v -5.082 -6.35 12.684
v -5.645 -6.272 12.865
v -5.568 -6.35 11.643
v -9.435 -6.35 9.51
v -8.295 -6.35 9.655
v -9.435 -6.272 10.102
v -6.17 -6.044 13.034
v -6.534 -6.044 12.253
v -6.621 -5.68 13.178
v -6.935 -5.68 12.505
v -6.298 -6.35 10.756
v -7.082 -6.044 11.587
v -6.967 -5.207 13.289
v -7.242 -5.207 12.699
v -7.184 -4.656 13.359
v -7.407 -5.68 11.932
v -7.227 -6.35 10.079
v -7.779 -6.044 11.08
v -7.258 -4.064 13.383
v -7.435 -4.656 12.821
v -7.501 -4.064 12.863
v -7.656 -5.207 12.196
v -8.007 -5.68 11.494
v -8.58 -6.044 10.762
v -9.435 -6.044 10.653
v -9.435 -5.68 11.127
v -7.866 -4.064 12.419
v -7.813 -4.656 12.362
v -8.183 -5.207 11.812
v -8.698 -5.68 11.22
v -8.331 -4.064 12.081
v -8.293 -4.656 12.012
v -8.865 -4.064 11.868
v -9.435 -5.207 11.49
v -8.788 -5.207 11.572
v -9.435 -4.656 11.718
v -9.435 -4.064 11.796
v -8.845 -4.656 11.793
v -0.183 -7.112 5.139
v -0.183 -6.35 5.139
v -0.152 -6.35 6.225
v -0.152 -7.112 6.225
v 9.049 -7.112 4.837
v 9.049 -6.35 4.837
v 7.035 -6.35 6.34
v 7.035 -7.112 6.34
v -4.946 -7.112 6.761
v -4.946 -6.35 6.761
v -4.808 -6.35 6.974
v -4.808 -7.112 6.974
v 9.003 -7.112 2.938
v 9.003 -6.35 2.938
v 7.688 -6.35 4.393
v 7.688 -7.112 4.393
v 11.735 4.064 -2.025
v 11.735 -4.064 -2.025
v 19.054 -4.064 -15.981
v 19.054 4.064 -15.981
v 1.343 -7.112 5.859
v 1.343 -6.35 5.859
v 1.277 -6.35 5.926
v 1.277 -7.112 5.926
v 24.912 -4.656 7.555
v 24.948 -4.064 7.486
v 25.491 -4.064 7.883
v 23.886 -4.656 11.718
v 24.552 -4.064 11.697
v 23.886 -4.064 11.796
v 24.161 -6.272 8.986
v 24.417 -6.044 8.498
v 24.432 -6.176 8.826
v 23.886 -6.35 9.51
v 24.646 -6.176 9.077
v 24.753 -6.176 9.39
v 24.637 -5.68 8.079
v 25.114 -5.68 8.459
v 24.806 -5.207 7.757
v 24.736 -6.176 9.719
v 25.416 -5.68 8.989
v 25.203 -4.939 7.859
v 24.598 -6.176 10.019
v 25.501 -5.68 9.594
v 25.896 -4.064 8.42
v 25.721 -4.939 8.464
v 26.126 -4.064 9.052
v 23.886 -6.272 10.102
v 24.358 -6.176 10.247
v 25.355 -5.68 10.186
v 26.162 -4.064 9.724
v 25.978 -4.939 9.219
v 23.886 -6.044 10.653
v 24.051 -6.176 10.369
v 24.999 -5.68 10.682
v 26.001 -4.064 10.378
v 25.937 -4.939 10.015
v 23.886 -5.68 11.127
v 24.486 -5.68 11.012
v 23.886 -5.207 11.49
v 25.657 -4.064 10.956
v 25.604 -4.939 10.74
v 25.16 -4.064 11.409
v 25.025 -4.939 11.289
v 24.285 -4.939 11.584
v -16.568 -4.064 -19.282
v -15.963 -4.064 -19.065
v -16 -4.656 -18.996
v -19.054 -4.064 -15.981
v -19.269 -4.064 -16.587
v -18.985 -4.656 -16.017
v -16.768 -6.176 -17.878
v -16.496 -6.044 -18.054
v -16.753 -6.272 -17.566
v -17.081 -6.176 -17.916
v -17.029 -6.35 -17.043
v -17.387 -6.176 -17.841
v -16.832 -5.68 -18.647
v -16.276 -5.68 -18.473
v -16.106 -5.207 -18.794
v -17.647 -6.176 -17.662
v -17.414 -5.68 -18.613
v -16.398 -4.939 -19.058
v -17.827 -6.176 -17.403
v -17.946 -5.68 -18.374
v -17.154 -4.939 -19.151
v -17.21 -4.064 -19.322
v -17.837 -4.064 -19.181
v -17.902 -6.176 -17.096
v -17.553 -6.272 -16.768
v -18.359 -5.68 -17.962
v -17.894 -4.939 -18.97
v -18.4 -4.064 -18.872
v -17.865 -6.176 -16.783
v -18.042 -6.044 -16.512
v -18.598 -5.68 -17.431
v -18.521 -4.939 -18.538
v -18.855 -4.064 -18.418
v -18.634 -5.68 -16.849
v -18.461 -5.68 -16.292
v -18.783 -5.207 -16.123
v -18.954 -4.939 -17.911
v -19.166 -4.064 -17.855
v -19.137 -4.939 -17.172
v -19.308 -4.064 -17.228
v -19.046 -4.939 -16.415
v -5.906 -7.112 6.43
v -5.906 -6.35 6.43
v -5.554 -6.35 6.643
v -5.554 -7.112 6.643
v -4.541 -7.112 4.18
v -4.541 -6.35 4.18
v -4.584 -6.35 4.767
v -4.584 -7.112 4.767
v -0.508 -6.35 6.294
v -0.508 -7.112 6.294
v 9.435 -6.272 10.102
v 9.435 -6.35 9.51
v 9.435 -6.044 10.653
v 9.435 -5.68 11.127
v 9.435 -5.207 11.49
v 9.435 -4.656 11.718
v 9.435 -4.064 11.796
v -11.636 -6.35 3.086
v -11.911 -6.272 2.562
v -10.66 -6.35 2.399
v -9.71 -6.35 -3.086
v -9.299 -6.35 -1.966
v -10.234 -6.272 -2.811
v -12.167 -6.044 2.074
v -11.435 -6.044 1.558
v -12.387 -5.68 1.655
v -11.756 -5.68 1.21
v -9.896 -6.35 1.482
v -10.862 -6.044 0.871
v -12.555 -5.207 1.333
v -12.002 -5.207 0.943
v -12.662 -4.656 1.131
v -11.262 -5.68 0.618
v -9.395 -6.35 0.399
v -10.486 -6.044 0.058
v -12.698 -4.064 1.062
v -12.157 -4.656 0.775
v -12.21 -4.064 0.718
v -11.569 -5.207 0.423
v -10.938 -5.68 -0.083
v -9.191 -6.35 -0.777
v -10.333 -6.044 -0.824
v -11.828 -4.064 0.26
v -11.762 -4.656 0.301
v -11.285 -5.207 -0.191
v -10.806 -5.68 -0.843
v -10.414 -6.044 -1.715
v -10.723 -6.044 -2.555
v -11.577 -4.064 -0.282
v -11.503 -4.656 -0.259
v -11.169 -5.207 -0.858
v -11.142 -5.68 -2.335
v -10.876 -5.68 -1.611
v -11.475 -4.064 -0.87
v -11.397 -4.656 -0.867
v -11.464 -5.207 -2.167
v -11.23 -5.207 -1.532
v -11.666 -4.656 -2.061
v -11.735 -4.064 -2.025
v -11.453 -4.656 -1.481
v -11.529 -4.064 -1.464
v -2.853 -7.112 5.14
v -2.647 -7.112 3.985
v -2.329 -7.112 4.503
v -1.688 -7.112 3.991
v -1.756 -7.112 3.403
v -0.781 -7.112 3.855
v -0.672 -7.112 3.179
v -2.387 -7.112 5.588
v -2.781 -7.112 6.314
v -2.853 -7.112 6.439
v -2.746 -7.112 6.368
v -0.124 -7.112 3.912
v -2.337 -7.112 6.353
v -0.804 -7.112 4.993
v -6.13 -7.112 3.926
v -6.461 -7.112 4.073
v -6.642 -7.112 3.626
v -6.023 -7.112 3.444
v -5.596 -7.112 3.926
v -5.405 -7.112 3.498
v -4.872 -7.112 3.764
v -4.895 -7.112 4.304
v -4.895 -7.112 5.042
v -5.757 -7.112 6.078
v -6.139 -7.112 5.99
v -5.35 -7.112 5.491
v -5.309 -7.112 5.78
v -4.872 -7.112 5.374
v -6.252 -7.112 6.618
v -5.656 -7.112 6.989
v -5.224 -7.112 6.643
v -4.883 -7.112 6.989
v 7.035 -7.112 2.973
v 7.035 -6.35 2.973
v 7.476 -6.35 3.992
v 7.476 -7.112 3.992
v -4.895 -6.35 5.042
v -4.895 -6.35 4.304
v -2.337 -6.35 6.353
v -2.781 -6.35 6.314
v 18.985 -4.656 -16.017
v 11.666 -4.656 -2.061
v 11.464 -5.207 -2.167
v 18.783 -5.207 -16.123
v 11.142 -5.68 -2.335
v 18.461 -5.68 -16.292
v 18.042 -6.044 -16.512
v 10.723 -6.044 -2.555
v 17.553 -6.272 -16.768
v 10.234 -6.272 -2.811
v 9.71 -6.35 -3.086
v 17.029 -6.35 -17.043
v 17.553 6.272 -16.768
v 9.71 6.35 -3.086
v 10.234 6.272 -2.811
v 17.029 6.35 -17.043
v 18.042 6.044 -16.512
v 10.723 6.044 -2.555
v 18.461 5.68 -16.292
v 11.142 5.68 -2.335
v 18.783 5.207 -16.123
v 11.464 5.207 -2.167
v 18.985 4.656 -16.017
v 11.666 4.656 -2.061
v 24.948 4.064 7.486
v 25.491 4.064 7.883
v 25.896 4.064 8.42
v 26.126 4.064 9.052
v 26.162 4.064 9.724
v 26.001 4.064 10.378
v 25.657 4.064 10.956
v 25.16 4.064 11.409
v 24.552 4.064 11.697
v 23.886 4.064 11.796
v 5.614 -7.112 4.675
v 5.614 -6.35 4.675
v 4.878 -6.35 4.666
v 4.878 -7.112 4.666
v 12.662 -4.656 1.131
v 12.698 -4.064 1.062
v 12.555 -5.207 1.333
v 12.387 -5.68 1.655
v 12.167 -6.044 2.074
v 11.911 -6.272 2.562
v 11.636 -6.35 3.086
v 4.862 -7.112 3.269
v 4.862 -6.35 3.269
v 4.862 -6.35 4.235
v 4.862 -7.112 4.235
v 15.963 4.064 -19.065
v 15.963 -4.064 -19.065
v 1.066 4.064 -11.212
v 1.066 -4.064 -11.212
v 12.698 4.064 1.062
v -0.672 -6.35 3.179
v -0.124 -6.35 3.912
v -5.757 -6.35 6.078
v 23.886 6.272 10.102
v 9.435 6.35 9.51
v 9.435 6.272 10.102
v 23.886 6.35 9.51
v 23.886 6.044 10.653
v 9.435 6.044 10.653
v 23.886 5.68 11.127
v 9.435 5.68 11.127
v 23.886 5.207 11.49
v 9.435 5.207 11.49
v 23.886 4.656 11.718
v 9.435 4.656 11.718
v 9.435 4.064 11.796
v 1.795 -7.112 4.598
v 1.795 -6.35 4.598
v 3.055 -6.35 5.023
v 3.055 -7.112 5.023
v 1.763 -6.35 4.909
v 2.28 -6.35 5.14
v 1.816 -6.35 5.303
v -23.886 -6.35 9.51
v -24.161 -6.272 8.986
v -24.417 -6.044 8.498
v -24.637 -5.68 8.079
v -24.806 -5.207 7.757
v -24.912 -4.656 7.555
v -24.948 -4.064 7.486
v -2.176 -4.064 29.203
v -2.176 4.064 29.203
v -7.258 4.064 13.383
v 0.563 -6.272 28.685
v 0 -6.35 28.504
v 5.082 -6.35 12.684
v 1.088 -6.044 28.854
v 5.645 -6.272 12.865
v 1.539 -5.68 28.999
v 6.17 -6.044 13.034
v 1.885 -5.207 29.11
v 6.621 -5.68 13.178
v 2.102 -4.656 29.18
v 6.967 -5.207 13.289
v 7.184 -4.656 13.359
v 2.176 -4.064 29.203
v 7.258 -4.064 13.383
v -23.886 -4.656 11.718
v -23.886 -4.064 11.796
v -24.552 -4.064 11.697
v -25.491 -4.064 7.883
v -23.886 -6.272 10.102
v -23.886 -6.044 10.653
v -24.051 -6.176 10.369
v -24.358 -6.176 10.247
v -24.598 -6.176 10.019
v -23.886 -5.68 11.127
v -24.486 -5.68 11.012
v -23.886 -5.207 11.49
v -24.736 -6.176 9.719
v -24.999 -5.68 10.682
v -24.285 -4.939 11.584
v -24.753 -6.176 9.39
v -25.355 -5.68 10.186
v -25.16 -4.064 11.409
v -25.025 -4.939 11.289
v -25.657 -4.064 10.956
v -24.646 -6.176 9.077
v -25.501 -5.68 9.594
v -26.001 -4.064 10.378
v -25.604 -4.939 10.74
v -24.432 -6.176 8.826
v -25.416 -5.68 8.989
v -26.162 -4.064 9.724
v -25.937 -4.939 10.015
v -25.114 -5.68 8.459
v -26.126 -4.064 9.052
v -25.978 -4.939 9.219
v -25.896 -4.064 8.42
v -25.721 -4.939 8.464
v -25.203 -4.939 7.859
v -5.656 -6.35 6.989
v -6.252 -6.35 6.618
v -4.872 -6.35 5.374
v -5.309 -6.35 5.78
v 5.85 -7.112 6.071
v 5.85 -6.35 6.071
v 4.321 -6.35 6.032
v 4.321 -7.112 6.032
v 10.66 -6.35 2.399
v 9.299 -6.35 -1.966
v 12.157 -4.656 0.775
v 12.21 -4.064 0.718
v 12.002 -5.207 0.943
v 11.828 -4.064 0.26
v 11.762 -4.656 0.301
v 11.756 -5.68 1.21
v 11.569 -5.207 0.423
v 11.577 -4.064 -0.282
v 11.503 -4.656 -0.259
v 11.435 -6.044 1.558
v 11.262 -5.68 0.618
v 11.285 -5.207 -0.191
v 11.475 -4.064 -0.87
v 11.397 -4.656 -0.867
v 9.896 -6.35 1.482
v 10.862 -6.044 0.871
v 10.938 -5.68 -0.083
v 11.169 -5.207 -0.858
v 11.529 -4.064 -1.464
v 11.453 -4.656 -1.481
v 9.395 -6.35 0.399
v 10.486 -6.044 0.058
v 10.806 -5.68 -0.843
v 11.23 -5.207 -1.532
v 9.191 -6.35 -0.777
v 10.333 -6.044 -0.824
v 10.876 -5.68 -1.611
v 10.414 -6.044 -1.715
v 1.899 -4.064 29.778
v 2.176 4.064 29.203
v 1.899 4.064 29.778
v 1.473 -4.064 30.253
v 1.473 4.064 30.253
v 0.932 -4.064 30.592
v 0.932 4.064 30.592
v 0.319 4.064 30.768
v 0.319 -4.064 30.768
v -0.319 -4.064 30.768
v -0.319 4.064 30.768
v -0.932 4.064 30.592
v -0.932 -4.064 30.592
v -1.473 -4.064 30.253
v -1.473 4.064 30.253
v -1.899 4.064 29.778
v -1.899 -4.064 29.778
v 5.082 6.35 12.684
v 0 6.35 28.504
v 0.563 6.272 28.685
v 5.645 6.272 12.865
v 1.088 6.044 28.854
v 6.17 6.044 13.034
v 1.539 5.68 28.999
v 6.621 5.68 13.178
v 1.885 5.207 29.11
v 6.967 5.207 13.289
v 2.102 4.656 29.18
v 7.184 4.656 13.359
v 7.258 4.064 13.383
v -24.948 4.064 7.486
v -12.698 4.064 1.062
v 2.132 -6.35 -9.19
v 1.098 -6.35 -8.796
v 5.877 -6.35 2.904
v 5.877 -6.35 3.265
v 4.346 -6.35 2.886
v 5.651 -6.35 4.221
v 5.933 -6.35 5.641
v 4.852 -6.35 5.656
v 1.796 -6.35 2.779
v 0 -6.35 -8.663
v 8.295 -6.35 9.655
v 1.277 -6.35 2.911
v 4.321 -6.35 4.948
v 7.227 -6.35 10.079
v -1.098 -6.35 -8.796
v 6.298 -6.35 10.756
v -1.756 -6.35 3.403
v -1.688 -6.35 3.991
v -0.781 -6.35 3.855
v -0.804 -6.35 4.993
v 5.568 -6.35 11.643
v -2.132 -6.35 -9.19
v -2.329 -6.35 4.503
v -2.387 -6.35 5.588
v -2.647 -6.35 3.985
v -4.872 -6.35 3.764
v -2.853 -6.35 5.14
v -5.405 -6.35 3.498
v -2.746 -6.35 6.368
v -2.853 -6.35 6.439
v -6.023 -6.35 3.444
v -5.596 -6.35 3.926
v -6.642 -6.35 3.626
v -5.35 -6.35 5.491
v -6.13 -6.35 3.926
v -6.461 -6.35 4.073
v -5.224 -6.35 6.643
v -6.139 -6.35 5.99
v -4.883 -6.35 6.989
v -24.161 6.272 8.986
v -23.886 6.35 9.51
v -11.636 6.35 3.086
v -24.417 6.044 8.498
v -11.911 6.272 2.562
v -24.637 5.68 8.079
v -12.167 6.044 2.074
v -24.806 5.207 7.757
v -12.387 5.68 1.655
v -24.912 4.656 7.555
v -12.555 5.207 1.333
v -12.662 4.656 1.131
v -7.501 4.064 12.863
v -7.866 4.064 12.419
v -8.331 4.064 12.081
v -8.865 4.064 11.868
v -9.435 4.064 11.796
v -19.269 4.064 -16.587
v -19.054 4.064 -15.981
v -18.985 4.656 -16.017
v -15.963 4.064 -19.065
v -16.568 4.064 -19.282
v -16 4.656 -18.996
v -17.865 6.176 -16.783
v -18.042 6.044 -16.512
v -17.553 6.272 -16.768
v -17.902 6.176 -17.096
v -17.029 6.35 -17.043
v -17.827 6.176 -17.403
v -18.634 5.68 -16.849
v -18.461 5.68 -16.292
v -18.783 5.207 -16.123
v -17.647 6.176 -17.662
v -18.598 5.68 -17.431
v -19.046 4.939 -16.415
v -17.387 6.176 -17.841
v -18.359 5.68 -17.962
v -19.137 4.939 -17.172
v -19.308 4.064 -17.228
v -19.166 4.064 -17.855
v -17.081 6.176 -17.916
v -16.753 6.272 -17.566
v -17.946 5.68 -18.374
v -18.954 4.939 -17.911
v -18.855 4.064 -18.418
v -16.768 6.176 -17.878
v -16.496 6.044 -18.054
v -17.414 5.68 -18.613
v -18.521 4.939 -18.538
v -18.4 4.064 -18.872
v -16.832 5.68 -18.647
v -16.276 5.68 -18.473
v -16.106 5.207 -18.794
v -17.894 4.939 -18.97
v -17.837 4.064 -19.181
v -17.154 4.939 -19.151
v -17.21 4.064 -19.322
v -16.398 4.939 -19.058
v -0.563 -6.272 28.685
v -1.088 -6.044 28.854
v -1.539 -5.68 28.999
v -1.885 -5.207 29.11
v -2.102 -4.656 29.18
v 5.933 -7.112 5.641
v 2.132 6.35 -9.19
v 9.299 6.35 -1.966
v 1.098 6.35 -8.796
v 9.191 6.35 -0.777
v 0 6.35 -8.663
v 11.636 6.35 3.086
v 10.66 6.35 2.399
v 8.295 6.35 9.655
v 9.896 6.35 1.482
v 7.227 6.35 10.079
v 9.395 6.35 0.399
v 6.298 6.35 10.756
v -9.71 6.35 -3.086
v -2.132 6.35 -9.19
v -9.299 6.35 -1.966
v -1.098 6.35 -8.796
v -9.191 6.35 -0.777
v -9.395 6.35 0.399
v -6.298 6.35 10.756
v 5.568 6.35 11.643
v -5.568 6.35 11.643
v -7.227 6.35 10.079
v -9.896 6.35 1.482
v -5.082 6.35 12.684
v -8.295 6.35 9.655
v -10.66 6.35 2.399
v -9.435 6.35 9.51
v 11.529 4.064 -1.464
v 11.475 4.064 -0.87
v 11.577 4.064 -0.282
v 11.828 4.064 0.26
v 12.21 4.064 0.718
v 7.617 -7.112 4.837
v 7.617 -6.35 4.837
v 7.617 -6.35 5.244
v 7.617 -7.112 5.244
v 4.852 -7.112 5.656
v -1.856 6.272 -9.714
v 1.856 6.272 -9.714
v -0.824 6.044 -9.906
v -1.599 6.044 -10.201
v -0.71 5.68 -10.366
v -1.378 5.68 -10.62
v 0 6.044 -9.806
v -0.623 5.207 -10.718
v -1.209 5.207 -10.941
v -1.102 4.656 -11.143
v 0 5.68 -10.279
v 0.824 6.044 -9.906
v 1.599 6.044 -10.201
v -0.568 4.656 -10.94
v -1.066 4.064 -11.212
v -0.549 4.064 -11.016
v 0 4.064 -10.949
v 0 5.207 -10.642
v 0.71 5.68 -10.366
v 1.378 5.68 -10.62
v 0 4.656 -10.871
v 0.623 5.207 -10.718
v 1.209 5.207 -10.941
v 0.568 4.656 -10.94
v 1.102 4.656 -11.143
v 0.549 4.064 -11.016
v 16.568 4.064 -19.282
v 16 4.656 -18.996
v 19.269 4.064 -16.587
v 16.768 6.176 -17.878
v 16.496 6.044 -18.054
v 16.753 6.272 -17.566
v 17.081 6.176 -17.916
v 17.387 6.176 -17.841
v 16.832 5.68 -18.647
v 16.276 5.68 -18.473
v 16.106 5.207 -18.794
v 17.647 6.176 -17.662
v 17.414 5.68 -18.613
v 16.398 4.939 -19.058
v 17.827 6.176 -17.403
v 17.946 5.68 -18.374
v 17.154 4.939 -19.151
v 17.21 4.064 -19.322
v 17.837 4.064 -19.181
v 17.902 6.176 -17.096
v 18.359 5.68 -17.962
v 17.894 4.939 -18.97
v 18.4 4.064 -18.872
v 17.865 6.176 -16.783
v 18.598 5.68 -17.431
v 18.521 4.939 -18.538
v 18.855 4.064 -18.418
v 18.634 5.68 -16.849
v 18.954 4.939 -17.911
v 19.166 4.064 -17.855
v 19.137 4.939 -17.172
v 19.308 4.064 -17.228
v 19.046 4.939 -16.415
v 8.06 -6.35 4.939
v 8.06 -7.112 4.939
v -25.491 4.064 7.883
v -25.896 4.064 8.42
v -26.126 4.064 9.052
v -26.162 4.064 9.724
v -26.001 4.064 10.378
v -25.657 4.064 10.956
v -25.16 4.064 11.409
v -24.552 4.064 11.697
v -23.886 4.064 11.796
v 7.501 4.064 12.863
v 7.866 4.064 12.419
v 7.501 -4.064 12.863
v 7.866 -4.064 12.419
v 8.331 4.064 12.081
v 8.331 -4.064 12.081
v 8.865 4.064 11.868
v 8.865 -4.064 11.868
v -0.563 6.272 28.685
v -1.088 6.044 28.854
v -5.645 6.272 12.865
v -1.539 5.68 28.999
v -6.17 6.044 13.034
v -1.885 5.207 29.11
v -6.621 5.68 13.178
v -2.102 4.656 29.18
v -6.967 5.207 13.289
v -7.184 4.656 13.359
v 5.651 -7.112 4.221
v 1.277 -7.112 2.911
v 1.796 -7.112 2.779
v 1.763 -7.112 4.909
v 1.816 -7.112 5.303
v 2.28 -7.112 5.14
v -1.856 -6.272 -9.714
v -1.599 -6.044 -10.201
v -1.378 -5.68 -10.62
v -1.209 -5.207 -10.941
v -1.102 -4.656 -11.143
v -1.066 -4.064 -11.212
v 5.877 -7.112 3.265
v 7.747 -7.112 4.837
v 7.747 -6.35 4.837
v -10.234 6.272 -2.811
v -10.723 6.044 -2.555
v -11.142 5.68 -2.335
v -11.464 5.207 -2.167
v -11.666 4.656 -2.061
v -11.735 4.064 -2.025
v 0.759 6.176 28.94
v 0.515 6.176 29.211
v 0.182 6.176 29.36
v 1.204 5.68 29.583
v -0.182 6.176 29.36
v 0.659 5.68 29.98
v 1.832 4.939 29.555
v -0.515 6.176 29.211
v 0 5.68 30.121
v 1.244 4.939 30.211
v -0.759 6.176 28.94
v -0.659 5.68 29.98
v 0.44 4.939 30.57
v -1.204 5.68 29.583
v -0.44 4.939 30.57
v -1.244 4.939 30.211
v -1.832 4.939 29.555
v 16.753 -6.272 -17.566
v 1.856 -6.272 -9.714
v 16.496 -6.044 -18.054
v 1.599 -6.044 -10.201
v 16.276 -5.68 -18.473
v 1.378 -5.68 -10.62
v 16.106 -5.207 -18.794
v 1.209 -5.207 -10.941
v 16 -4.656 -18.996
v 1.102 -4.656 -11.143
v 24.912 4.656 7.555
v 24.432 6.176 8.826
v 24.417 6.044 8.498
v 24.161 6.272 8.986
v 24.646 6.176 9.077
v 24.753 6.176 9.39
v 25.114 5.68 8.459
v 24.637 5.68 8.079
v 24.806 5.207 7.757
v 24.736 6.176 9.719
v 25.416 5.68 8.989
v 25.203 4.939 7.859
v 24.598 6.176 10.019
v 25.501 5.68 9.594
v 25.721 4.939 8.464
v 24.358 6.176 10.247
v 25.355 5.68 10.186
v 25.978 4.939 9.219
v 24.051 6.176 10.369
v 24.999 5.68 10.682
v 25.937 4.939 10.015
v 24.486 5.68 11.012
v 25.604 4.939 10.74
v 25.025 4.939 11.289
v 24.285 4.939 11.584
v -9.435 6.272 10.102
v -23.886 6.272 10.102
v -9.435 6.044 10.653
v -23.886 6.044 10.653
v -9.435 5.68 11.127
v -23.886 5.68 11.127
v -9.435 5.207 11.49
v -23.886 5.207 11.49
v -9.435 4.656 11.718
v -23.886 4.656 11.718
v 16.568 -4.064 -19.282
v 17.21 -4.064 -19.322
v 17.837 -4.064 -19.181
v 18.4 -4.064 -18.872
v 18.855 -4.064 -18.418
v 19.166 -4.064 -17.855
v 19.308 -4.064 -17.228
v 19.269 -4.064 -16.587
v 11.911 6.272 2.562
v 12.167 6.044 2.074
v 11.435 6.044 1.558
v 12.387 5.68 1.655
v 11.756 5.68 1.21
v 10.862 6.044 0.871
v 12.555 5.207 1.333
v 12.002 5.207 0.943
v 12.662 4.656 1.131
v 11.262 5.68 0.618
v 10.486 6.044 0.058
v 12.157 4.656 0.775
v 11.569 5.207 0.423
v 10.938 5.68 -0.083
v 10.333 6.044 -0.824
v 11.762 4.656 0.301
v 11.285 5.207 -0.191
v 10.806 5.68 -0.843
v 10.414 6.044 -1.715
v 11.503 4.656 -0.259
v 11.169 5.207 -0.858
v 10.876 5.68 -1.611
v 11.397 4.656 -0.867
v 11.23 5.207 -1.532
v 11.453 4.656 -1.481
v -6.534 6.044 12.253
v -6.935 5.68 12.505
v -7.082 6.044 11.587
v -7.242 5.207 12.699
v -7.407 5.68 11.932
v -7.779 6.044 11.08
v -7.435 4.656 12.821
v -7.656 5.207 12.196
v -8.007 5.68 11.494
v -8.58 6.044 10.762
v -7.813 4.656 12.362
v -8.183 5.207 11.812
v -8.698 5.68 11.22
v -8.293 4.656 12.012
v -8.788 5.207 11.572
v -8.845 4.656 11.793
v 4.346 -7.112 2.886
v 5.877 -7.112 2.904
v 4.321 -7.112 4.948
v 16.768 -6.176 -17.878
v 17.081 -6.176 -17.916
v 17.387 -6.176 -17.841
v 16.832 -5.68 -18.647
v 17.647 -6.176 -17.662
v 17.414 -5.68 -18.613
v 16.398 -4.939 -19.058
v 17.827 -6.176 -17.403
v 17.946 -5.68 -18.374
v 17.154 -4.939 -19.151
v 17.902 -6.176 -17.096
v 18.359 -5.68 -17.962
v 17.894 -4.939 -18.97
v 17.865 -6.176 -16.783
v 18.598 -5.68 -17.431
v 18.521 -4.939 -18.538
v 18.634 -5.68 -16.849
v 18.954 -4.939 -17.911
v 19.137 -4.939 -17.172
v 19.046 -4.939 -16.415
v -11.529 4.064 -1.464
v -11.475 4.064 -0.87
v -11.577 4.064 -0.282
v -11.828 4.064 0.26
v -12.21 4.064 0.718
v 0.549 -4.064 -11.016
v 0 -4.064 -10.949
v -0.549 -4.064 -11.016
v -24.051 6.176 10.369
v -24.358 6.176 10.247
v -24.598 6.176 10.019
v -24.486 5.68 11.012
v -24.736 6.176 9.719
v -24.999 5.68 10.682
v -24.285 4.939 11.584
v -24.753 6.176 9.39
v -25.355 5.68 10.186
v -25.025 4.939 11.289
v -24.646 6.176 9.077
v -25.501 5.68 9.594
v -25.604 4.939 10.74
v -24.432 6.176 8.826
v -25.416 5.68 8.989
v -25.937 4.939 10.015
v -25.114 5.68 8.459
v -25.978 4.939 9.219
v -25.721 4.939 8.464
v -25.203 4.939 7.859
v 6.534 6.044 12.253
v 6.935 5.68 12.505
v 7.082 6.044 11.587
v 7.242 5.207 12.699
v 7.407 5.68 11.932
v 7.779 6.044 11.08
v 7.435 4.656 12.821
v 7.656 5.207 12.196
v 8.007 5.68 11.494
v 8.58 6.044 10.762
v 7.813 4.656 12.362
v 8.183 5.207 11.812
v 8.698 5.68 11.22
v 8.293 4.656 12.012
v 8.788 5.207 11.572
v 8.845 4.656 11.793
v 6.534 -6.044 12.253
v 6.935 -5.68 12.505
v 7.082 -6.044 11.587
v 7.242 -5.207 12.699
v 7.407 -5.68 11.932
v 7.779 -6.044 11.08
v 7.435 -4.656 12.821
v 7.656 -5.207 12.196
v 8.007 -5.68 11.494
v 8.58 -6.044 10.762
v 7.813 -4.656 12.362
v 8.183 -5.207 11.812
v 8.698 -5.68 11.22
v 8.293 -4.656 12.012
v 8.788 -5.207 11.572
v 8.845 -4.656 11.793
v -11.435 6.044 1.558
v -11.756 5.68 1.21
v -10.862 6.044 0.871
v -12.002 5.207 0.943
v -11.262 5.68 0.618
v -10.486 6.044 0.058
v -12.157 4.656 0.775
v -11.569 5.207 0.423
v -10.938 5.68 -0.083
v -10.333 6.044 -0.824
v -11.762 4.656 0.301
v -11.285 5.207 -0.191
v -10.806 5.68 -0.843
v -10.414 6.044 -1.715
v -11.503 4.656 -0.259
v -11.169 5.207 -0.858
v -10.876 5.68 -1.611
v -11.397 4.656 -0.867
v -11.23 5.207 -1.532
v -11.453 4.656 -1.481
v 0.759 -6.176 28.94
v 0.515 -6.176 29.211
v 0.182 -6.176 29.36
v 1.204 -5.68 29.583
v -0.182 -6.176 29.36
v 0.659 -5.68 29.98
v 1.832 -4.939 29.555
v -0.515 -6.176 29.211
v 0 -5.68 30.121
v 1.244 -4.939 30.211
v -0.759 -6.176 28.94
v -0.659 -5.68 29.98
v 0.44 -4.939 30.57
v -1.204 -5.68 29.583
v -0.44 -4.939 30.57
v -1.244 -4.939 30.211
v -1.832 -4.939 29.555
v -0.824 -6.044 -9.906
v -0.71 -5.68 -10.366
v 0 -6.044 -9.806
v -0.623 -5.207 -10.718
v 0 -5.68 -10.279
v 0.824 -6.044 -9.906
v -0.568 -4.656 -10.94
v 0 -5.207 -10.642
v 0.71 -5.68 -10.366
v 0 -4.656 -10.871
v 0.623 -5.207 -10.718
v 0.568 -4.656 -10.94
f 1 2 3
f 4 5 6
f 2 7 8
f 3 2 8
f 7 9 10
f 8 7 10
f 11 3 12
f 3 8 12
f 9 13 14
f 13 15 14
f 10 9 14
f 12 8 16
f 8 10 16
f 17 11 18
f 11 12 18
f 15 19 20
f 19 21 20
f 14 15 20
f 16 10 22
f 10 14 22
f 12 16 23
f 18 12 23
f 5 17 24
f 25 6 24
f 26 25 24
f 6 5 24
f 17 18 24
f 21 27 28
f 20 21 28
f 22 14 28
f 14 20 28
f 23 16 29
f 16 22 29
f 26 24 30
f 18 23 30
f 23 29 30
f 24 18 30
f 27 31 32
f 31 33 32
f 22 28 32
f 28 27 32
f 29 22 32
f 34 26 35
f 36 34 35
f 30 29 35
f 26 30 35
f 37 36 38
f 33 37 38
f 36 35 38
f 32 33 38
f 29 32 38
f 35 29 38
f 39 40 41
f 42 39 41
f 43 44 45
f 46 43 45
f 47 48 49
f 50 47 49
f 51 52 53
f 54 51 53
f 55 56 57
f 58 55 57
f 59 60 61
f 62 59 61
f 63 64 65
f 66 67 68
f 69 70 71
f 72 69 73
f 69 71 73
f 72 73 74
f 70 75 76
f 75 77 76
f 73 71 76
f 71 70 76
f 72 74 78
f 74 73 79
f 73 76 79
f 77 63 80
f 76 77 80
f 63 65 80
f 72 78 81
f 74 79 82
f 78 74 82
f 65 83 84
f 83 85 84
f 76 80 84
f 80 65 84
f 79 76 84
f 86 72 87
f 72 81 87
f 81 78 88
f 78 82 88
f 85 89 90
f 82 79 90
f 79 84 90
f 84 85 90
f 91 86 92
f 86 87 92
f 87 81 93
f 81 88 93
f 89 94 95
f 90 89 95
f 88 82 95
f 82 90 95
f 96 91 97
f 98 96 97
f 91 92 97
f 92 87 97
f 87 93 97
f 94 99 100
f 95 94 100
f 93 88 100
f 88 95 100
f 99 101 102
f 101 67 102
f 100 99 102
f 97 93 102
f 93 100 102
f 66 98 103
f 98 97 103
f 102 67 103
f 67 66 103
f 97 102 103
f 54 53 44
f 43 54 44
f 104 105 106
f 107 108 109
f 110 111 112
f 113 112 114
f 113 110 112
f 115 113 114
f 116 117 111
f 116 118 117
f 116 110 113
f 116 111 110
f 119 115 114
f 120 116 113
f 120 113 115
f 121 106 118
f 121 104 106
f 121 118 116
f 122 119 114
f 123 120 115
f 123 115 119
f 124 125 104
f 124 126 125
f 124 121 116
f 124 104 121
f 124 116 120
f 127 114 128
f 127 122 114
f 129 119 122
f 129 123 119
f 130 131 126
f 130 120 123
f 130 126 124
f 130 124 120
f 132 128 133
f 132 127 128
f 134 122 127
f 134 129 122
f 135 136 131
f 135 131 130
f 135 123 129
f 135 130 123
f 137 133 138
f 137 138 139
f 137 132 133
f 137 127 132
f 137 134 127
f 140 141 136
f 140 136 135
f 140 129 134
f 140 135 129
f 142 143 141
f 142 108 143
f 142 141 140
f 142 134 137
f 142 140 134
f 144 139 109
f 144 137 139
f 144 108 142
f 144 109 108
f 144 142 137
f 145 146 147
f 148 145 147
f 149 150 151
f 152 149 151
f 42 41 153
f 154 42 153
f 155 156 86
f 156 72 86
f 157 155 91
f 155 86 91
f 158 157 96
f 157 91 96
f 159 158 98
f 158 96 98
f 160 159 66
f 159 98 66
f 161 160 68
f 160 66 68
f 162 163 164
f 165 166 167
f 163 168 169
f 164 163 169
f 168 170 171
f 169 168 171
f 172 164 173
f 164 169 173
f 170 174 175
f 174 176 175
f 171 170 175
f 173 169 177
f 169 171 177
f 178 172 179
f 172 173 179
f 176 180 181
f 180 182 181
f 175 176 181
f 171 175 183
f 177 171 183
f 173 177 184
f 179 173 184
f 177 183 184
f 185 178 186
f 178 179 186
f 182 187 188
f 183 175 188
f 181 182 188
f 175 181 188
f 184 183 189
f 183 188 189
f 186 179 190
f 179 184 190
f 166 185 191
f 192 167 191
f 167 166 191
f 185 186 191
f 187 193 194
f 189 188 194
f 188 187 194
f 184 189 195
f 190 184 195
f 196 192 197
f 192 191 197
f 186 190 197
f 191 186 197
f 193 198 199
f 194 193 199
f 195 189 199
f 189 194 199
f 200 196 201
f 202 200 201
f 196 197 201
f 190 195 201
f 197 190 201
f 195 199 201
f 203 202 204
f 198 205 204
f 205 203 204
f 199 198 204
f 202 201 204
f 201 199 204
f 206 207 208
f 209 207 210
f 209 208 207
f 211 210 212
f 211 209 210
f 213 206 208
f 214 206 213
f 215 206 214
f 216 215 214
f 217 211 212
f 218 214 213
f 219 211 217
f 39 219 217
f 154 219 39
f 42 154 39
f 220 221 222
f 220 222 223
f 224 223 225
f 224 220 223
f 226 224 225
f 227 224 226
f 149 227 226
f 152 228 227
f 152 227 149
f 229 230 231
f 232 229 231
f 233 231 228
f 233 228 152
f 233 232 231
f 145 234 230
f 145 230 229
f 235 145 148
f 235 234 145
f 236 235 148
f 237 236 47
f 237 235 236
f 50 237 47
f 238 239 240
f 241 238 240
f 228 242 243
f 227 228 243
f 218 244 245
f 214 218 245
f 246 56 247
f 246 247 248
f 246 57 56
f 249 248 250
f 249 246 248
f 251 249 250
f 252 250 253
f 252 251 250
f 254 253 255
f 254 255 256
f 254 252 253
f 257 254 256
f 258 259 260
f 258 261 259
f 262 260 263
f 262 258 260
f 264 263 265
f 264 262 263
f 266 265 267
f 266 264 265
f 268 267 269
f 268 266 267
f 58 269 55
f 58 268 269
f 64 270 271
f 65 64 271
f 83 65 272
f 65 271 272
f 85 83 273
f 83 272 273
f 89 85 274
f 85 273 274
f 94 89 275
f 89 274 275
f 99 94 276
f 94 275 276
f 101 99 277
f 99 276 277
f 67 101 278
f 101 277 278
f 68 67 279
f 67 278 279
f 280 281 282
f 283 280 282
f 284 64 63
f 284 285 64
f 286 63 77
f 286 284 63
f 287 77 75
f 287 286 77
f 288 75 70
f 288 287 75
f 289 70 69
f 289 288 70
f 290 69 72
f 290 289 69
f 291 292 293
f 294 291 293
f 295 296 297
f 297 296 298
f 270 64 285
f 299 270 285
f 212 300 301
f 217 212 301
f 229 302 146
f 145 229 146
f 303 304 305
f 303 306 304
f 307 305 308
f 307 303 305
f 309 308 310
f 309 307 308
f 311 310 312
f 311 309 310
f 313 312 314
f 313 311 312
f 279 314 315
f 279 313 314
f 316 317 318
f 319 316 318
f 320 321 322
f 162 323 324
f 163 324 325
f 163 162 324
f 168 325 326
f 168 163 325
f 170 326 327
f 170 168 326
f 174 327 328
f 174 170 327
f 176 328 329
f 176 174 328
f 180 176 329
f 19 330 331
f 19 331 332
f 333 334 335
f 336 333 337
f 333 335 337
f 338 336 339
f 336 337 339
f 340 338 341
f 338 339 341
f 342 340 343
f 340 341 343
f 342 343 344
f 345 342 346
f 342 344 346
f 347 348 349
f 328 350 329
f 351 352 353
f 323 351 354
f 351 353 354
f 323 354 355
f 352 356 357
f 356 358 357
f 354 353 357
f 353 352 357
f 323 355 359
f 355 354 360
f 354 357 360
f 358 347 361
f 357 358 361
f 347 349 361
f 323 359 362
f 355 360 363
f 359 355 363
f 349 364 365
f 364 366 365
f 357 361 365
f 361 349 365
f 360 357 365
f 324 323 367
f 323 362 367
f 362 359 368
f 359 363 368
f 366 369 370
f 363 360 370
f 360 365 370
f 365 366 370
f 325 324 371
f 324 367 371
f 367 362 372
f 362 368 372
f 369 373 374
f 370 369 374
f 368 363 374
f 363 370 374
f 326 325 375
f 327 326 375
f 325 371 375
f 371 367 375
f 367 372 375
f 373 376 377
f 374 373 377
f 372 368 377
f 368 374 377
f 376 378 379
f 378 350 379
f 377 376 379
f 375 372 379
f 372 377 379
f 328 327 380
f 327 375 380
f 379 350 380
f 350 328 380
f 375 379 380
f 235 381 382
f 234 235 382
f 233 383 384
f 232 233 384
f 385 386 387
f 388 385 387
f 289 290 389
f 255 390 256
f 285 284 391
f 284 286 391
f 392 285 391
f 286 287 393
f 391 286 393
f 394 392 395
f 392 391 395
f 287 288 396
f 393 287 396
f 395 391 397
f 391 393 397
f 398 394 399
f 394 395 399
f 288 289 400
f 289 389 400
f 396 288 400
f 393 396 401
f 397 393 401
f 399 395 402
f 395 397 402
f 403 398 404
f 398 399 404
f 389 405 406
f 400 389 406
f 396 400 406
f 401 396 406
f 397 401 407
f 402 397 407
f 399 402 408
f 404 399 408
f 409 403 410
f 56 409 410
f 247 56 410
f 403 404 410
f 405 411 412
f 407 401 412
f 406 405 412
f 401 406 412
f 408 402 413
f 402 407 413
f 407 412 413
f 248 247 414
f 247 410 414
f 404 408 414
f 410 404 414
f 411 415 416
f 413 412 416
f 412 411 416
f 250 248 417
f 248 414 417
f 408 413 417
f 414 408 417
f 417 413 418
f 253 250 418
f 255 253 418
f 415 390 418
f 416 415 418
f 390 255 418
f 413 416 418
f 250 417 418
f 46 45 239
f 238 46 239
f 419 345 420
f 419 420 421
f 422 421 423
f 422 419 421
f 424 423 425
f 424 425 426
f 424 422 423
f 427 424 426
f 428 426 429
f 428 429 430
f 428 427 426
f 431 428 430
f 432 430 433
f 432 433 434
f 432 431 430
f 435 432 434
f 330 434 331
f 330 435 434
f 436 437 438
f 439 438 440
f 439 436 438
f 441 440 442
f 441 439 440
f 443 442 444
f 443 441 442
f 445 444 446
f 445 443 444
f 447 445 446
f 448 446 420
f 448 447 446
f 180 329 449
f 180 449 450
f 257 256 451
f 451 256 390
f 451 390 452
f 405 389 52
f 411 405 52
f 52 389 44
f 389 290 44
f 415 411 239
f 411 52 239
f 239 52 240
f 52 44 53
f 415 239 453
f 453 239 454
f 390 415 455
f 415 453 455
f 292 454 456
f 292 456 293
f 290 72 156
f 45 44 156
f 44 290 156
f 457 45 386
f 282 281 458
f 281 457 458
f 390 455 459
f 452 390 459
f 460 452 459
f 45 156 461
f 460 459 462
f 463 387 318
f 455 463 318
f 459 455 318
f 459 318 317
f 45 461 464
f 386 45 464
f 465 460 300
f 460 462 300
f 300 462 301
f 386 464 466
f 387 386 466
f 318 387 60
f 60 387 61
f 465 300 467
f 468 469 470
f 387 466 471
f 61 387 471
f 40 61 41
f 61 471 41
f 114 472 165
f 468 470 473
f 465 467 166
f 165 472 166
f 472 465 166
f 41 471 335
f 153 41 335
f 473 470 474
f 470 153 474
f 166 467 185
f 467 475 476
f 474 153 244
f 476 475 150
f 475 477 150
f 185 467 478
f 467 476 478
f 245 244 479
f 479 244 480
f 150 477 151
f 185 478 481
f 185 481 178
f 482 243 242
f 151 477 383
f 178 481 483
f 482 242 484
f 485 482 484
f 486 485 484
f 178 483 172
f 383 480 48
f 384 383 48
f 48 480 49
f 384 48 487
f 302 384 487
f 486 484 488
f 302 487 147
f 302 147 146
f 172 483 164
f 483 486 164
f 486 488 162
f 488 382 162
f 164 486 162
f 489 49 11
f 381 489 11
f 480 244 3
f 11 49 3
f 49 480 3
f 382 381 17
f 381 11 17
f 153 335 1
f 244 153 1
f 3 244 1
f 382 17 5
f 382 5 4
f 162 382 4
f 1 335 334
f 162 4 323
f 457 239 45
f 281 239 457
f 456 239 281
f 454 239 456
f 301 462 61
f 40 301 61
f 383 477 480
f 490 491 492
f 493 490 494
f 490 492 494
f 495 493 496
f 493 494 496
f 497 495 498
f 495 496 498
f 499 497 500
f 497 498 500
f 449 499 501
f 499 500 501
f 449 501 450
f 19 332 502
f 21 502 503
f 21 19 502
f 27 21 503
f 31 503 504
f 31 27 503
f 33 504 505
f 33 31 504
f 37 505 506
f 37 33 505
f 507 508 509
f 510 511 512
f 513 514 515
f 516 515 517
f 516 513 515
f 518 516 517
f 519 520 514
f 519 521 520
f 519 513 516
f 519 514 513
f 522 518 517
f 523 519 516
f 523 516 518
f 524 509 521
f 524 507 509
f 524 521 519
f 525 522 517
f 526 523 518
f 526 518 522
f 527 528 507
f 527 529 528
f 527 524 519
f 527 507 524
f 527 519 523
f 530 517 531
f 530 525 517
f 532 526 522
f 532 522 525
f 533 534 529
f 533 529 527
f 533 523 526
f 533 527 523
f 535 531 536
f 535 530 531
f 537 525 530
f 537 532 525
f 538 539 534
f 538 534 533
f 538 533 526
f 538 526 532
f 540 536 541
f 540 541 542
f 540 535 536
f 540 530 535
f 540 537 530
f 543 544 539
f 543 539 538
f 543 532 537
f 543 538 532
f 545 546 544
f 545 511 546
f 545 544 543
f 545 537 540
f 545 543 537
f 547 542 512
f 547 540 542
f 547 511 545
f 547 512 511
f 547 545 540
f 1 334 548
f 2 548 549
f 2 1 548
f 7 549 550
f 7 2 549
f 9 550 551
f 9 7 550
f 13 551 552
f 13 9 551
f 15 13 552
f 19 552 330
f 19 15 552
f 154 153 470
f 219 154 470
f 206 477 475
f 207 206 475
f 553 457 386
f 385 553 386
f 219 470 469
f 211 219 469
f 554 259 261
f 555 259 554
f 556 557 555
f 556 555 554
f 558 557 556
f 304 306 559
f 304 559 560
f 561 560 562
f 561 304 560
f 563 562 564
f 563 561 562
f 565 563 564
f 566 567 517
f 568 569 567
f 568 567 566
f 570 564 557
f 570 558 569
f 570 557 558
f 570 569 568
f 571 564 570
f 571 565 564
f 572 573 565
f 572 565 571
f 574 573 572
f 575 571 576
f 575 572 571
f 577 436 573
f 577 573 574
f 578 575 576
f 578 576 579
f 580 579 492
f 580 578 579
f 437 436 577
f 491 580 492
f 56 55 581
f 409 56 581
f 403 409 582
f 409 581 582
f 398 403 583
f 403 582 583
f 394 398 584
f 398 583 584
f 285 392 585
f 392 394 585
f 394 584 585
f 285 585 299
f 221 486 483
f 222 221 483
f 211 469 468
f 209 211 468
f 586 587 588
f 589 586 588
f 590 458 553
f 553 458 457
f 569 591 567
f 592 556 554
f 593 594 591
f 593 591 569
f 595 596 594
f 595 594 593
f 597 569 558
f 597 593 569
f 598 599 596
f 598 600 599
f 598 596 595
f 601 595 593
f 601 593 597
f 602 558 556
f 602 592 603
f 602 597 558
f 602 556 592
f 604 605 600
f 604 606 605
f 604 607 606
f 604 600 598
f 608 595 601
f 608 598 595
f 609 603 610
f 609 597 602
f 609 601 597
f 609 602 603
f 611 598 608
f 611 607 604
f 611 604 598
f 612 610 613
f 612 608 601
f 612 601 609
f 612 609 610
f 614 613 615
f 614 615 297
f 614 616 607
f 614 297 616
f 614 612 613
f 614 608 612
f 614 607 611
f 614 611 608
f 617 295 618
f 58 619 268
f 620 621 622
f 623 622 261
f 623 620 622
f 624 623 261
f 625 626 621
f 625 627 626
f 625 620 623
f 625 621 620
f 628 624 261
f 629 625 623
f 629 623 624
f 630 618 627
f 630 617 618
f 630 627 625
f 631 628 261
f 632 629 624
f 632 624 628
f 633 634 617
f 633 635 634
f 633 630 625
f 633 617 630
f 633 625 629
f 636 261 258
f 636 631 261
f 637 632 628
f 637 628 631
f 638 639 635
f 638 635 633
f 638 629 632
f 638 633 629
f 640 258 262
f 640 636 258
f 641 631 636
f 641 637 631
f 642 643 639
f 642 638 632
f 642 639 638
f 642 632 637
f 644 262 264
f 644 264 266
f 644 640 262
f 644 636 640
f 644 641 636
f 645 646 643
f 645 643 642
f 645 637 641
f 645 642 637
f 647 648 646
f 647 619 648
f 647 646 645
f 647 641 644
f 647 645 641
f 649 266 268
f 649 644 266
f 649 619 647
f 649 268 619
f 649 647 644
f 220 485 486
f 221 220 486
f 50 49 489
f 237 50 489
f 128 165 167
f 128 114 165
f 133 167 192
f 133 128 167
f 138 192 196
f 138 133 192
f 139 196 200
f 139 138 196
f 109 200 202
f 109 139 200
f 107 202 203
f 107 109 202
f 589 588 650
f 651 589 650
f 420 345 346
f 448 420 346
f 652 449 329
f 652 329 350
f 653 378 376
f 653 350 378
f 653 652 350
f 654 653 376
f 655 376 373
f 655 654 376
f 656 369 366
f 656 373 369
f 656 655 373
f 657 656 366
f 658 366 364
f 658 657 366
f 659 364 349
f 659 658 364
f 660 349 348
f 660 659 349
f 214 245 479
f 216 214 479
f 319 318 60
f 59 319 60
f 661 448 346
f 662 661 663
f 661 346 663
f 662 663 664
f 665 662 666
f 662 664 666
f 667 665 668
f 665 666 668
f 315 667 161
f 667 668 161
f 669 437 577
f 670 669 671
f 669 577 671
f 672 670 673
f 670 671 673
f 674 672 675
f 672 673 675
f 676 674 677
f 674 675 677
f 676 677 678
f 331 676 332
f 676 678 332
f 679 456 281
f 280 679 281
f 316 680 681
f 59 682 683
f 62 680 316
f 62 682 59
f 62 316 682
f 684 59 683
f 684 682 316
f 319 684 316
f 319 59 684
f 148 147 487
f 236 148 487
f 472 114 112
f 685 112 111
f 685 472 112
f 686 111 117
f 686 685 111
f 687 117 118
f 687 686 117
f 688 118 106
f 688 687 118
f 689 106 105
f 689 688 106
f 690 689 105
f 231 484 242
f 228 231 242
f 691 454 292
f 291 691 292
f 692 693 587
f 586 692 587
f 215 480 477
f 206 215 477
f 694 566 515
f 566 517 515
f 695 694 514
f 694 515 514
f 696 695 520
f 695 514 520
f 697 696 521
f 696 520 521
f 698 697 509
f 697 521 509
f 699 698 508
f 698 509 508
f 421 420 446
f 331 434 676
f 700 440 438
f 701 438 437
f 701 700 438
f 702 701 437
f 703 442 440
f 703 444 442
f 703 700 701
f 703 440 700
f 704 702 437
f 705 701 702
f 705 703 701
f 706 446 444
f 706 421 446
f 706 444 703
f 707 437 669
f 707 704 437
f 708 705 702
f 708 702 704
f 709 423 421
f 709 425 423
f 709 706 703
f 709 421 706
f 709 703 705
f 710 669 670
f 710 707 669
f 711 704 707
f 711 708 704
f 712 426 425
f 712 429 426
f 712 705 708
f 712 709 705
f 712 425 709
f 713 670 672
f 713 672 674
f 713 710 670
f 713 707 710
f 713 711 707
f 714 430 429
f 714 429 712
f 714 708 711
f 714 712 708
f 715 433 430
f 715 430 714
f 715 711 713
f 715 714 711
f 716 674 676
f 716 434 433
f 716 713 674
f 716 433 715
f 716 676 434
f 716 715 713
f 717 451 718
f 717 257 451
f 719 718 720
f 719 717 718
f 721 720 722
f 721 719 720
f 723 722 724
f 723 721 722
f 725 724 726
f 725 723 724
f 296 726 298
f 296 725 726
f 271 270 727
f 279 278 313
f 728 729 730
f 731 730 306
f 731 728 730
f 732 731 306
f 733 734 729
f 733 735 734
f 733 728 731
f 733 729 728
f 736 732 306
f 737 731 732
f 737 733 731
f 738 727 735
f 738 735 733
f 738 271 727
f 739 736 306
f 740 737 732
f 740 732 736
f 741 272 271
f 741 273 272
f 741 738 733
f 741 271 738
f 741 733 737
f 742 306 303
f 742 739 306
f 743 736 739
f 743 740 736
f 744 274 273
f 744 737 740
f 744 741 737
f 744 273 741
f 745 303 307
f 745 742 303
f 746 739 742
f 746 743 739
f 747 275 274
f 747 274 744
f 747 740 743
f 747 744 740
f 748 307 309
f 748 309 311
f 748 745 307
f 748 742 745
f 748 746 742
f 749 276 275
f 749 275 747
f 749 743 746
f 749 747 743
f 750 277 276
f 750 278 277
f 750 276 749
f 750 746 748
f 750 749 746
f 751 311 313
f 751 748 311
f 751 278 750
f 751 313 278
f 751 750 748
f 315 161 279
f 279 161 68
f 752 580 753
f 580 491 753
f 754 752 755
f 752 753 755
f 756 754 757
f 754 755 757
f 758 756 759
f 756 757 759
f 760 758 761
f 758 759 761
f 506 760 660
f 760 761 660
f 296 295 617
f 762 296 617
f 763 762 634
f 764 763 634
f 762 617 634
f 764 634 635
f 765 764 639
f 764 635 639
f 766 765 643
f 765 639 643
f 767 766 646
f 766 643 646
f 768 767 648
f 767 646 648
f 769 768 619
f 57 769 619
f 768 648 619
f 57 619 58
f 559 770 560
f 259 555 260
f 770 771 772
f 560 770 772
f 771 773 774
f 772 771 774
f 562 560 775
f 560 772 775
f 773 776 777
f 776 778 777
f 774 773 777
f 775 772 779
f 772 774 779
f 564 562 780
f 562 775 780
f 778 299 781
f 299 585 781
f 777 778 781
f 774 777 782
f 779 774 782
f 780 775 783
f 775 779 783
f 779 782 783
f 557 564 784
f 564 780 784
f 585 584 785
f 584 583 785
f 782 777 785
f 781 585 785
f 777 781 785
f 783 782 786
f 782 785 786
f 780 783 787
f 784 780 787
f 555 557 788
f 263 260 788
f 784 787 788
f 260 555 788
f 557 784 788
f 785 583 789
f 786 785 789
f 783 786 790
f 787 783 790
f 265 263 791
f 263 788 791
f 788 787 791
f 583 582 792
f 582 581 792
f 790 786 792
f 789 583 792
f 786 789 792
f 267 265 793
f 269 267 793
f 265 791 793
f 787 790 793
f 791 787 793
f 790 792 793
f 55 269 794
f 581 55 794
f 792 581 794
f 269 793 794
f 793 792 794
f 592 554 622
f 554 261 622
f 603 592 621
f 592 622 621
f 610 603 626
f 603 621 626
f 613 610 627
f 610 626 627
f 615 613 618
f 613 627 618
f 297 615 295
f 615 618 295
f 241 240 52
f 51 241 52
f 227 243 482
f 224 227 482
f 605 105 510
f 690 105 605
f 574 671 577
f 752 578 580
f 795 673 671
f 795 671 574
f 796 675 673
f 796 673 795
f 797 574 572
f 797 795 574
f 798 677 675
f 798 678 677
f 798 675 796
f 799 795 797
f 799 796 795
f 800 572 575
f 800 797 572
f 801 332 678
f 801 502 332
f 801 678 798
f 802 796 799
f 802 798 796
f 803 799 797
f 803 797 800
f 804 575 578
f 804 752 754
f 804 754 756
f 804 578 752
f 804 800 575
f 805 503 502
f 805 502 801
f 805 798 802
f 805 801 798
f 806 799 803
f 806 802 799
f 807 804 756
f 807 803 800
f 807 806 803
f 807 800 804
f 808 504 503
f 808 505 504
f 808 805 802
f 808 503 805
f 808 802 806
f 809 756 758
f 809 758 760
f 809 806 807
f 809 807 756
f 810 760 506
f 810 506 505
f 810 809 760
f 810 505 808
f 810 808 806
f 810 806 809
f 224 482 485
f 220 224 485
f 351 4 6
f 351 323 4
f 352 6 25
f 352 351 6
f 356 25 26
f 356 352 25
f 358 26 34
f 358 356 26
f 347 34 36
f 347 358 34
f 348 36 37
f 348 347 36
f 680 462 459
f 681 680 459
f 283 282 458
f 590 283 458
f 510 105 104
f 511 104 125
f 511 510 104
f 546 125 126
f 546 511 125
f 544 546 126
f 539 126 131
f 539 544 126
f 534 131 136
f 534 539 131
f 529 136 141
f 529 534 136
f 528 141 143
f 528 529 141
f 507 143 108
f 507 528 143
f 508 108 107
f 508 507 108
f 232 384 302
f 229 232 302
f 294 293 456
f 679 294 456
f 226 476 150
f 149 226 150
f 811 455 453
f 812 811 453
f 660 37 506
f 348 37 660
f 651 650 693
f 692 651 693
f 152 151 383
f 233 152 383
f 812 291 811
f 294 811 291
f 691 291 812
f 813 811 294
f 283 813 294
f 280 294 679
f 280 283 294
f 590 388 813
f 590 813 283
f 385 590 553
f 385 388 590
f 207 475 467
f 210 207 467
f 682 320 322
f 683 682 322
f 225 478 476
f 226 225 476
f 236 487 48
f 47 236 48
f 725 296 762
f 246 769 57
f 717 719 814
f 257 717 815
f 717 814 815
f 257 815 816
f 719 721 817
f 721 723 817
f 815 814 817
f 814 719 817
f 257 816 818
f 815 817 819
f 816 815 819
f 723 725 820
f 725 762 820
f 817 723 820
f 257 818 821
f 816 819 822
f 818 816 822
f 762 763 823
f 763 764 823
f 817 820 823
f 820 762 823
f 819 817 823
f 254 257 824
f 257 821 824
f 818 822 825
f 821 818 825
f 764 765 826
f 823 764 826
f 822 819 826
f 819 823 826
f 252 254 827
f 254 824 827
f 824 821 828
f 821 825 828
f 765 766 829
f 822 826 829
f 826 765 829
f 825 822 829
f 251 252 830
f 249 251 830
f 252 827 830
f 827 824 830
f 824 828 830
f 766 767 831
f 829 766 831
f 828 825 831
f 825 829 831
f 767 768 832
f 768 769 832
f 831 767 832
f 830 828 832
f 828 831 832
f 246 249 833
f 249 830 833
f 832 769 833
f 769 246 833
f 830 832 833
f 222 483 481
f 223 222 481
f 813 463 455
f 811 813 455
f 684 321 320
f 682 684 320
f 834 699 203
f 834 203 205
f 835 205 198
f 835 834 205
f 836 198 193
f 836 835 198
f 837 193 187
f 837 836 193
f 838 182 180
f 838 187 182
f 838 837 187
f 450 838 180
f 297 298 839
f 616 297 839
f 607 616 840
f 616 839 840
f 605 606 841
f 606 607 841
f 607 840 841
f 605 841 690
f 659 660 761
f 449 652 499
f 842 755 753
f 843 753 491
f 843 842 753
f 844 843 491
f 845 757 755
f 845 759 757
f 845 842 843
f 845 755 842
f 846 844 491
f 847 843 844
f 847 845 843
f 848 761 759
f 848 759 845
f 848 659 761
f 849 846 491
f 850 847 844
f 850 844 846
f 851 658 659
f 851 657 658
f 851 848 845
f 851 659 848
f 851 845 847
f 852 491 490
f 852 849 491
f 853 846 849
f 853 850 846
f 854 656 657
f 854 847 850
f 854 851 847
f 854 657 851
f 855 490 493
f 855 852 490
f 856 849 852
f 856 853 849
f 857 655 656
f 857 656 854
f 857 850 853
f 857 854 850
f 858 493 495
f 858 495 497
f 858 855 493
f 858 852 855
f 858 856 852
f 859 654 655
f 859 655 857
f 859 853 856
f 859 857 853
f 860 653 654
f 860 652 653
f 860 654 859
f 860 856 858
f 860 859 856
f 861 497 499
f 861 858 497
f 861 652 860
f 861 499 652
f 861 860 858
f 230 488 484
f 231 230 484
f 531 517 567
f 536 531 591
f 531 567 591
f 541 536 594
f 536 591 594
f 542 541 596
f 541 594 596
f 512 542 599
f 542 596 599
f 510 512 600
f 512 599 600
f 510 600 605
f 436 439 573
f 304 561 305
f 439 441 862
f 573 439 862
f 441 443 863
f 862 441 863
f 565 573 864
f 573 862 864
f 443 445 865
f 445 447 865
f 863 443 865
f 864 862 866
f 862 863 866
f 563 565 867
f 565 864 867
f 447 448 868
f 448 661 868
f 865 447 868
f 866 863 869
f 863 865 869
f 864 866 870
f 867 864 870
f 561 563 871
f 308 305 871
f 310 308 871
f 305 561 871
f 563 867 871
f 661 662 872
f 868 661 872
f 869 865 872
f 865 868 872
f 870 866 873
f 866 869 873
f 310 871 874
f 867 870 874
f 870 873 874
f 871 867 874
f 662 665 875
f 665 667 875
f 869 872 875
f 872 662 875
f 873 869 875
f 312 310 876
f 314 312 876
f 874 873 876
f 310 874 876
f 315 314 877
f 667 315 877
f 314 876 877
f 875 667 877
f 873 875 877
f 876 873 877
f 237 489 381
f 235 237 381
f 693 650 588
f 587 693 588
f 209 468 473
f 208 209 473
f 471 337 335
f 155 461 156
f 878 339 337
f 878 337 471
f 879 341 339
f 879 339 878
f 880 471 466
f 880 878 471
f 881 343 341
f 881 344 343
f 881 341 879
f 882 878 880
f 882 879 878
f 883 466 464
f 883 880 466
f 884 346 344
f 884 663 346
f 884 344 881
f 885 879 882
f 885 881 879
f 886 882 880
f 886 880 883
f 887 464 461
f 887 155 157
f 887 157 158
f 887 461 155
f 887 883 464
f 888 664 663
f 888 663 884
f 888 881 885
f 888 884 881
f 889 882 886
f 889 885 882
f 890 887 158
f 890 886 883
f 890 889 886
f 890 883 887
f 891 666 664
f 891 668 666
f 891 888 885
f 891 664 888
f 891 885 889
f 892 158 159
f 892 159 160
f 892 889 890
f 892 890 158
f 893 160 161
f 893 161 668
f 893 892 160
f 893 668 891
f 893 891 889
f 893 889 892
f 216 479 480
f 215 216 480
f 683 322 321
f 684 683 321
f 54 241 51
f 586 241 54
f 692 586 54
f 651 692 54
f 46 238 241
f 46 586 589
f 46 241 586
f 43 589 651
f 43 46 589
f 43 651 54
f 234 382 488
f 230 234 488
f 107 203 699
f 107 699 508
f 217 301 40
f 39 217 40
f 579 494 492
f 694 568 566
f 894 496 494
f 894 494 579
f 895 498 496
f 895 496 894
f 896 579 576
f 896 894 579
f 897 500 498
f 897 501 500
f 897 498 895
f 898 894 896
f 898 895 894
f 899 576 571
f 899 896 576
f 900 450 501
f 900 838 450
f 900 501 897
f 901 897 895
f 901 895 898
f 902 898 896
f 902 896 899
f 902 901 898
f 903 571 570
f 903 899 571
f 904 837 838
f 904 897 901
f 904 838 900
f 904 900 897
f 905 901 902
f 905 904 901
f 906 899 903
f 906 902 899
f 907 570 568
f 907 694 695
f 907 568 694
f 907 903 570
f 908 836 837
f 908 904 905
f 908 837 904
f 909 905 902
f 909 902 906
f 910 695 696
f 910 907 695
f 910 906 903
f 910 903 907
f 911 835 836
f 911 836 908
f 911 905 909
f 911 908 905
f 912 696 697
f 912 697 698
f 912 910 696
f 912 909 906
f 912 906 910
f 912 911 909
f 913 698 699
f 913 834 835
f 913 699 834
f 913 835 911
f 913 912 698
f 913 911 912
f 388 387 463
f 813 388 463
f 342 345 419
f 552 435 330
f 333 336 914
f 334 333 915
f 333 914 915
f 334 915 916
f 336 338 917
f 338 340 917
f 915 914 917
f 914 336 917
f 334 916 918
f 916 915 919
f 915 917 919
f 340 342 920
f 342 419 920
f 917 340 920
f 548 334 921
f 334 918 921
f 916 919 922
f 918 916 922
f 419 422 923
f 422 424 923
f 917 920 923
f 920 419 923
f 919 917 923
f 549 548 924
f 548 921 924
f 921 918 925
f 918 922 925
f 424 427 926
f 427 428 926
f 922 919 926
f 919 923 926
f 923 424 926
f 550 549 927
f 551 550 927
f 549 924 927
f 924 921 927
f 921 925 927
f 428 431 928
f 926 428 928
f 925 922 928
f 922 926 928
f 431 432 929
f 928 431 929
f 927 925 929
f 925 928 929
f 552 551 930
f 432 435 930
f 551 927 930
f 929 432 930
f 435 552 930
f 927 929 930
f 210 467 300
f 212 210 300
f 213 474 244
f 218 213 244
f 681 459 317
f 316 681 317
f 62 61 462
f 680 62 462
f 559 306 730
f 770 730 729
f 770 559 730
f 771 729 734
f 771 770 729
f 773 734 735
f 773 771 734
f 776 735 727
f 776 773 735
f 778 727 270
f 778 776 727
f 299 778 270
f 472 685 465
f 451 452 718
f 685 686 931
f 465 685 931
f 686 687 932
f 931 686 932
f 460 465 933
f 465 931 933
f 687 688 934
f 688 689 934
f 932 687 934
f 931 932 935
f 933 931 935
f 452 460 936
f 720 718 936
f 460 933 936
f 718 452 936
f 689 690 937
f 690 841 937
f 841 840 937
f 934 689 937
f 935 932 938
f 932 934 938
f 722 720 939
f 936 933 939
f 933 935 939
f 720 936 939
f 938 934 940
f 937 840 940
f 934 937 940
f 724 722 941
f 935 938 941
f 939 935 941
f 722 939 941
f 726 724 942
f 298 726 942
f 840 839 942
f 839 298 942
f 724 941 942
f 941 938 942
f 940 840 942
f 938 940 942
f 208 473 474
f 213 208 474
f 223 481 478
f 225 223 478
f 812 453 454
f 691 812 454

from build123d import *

# Parameters (mm, degrees)
F2_DEPTH = 6.35
F4_F1_R  = 2.286
F4_F2_R  = 2.286
F9_DEPTH = 0.762
F7_DEPTH = 0.762


with BuildPart() as f2:
    # F1 (on face) → F2 (new body, symmetric)
    with BuildSketch(Plane.XZ):
        Polygon((-22.4694542891, -22.4946287922), (0, -10.6504899906), (0, 35.9793268616), (-7.7678262384, 11.7962568429), (-33.1678262384, 11.7962568429), (-10.6731974462, 0), align=None)
    extrude(amount=F2_DEPTH, both=True)

    # F3: F2 across plane


with BuildPart() as f2_1:
    add(f2.part)
    add(f2.part.mirror(Plane.YZ))

    # F4: fillet of radius 2.286 on 26 edges, made by hand

    # F4_f1
    f4_f1_edges = [f2_1.edges().sort_by_distance(p)[0] for p in [
        (7.7678262384, 0, 11.7962568429),
        (10.6731974462, 0, 0),
        (0, 0, -10.6504899906),
        (-10.6731974462, 0, 0),
        (-7.7678262384, 0, 11.7962568429),
    ]]
    fillet(f4_f1_edges, radius=F4_F1_R)

    # F4_f2
    f4_f2_edges = [f2_1.edges().sort_by_distance(p)[0] for p in [
        (-11.7677133906, -6.35, -16.8535080516),
        (11.7677133906, -6.35, -16.8535080516),
        (17.1021574256, -6.35, -12.2595726917),
        (22.932770138, -6.35, 6.4289599794),
        (21.3012015954, -6.35, 11.7962568429),
        (3.6290503253, -6.35, 24.6812396715),
        (-3.6290503253, -6.35, 24.6812396715),
        (-21.3012015954, -6.35, 11.7962568429),
        (-22.932770138, -6.35, 6.4289599794),
        (-17.1021574256, -6.35, -12.2595726917),
        (0, 0, 35.9793268616),
        (3.6290503253, 6.35, 24.6812396715),
        (21.3012015954, 6.35, 11.7962568429),
        (33.1678262384, 0, 11.7962568429),
        (17.1021574256, 6.35, -12.2595726917),
        (22.4694542891, 0, -22.4946287922),
        (-11.7677133906, 6.35, -16.8535080516),
        (-22.4694542891, 0, -22.4946287922),
        (-22.932770138, 6.35, 6.4289599794),
        (-33.1678262384, 0, 11.7962568429),
        (-21.3012015954, 6.35, 11.7962568429),
        (-8.0877949674, 6.35, 12.2351038213),
        (-11.5771185545, 6.35, -0.2820132537),
        (0, 6.35, -10.948638197),
        (11.5771185545, 6.35, -0.2820132537),
        (8.0877949674, 6.35, 12.2351038213),
        (-11.5771185545, -6.35, -0.2820132537),
        (-8.0877949674, -6.35, 12.2351038213),
        (8.0877949674, -6.35, 12.2351038213),
        (11.5771185545, -6.35, -0.2820132537),
        (0, -6.35, -10.948638197),
    ]]
    fillet(f4_f2_edges, radius=F4_F2_R)

    # F8 (on face) → F9 (join)
    with BuildSketch(Plane.XZ.offset(6.35)):
        Polygon((-4.8077497631, 6.9738719612), (-4.8833619803, 6.9888005964), (-5.6563438848, 6.9888005964), (-6.2521840446, 6.6184131429), (-6.1394576915, 5.9903655201), (-5.3503718227, 5.4911477491), (-4.8953713849, 5.0424882211), (-4.8953713849, 4.3044914491), (-5.5958377197, 3.9264927618), (-6.1300005764, 3.9264927618), (-6.4605637453, 4.0734503418), (-6.6418400966, 3.6255908199), (-6.0233678669, 3.4443144687), (-5.4048956372, 3.4976312891), (-4.8717297614, 3.7642139941), (-4.5411670581, 4.180083517), (-4.583820235, 4.7665657476), (-4.8717297614, 5.3743747994), (-5.3089256398, 5.7795806788), (-5.7567846961, 6.078153383), (-5.9060710482, 6.4300429076), (-5.5541819893, 6.6433092579), (-5.223619286, 6.6433092579), (-4.9463729374, 6.7606056109), align=None)
    extrude(amount=F9_DEPTH)

    # F6 (on face) → F7 (join)
    with BuildSketch(Plane.XZ.offset(6.35)):
        Polygon((-2.7460011188, 6.3680754974), (-2.852873411, 6.4385421574), (-2.852873411, 5.140052177), (-2.6468993165, 3.9846990258), (-1.7563264119, 3.4034063574), (-0.6719225785, 3.1792041846), (-0.124490587, 3.912220709), (-0.1830757828, 5.1394319162), (-0.1522420207, 6.2248986214), (-0.5077649839, 6.2937401235), (-0.8040870307, 4.9930457026), (-0.7814072305, 3.8545557763), (-1.6878197202, 3.9909644984), (-2.3294347338, 4.5027183369), (-2.3874049075, 5.5876043625), (-2.337427577, 6.3529536128), (-2.7812926564, 6.314471364), align=None)
        Polygon((1.3429354876, 5.8594592847), (1.2765517458, 5.9258458205), (1.2765517458, 2.9113423079), (1.7961976118, 2.7786572464), (1.7949150642, 4.5979730785), (3.0550148804, 5.0231530331), align=None)
        Polygon((2.2798031569, 5.1395706832), (1.7628639471, 4.9090404063), (1.8159369938, 5.3025046363), align=None, mode=Mode.SUBTRACT)
        Polygon((5.8496114798, 6.0712443665), (4.3209996074, 6.0321558267), (4.3209996074, 4.947821144), (4.3456433341, 2.8858925216), (5.8767511191, 2.904191992), (5.8767511191, 3.2648150809), (4.8615592532, 3.2685473561), (4.8615592532, 4.235221073), (5.6510670111, 4.220648203), (5.6144981645, 4.6745948493), (4.8782676458, 4.666226916), (4.8519740812, 5.6559145451), (5.933160428, 5.6408806704), align=None)
        Polygon((7.0347818546, 6.3396086916), (7.0347818546, 2.9729763046), (7.4759777635, 3.9922273718), (9.0028224513, 2.937797457), (7.6884618029, 4.3934863061), (9.0492879972, 4.8372442834), align=None)
        Polygon((8.0597589084, 4.9393000391), (7.7467951924, 4.8372442834), (7.6166405343, 4.8372442834), (7.6166405343, 5.243926309), align=None, mode=Mode.SUBTRACT)
    extrude(amount=F7_DEPTH)


solid = f2_1.part
